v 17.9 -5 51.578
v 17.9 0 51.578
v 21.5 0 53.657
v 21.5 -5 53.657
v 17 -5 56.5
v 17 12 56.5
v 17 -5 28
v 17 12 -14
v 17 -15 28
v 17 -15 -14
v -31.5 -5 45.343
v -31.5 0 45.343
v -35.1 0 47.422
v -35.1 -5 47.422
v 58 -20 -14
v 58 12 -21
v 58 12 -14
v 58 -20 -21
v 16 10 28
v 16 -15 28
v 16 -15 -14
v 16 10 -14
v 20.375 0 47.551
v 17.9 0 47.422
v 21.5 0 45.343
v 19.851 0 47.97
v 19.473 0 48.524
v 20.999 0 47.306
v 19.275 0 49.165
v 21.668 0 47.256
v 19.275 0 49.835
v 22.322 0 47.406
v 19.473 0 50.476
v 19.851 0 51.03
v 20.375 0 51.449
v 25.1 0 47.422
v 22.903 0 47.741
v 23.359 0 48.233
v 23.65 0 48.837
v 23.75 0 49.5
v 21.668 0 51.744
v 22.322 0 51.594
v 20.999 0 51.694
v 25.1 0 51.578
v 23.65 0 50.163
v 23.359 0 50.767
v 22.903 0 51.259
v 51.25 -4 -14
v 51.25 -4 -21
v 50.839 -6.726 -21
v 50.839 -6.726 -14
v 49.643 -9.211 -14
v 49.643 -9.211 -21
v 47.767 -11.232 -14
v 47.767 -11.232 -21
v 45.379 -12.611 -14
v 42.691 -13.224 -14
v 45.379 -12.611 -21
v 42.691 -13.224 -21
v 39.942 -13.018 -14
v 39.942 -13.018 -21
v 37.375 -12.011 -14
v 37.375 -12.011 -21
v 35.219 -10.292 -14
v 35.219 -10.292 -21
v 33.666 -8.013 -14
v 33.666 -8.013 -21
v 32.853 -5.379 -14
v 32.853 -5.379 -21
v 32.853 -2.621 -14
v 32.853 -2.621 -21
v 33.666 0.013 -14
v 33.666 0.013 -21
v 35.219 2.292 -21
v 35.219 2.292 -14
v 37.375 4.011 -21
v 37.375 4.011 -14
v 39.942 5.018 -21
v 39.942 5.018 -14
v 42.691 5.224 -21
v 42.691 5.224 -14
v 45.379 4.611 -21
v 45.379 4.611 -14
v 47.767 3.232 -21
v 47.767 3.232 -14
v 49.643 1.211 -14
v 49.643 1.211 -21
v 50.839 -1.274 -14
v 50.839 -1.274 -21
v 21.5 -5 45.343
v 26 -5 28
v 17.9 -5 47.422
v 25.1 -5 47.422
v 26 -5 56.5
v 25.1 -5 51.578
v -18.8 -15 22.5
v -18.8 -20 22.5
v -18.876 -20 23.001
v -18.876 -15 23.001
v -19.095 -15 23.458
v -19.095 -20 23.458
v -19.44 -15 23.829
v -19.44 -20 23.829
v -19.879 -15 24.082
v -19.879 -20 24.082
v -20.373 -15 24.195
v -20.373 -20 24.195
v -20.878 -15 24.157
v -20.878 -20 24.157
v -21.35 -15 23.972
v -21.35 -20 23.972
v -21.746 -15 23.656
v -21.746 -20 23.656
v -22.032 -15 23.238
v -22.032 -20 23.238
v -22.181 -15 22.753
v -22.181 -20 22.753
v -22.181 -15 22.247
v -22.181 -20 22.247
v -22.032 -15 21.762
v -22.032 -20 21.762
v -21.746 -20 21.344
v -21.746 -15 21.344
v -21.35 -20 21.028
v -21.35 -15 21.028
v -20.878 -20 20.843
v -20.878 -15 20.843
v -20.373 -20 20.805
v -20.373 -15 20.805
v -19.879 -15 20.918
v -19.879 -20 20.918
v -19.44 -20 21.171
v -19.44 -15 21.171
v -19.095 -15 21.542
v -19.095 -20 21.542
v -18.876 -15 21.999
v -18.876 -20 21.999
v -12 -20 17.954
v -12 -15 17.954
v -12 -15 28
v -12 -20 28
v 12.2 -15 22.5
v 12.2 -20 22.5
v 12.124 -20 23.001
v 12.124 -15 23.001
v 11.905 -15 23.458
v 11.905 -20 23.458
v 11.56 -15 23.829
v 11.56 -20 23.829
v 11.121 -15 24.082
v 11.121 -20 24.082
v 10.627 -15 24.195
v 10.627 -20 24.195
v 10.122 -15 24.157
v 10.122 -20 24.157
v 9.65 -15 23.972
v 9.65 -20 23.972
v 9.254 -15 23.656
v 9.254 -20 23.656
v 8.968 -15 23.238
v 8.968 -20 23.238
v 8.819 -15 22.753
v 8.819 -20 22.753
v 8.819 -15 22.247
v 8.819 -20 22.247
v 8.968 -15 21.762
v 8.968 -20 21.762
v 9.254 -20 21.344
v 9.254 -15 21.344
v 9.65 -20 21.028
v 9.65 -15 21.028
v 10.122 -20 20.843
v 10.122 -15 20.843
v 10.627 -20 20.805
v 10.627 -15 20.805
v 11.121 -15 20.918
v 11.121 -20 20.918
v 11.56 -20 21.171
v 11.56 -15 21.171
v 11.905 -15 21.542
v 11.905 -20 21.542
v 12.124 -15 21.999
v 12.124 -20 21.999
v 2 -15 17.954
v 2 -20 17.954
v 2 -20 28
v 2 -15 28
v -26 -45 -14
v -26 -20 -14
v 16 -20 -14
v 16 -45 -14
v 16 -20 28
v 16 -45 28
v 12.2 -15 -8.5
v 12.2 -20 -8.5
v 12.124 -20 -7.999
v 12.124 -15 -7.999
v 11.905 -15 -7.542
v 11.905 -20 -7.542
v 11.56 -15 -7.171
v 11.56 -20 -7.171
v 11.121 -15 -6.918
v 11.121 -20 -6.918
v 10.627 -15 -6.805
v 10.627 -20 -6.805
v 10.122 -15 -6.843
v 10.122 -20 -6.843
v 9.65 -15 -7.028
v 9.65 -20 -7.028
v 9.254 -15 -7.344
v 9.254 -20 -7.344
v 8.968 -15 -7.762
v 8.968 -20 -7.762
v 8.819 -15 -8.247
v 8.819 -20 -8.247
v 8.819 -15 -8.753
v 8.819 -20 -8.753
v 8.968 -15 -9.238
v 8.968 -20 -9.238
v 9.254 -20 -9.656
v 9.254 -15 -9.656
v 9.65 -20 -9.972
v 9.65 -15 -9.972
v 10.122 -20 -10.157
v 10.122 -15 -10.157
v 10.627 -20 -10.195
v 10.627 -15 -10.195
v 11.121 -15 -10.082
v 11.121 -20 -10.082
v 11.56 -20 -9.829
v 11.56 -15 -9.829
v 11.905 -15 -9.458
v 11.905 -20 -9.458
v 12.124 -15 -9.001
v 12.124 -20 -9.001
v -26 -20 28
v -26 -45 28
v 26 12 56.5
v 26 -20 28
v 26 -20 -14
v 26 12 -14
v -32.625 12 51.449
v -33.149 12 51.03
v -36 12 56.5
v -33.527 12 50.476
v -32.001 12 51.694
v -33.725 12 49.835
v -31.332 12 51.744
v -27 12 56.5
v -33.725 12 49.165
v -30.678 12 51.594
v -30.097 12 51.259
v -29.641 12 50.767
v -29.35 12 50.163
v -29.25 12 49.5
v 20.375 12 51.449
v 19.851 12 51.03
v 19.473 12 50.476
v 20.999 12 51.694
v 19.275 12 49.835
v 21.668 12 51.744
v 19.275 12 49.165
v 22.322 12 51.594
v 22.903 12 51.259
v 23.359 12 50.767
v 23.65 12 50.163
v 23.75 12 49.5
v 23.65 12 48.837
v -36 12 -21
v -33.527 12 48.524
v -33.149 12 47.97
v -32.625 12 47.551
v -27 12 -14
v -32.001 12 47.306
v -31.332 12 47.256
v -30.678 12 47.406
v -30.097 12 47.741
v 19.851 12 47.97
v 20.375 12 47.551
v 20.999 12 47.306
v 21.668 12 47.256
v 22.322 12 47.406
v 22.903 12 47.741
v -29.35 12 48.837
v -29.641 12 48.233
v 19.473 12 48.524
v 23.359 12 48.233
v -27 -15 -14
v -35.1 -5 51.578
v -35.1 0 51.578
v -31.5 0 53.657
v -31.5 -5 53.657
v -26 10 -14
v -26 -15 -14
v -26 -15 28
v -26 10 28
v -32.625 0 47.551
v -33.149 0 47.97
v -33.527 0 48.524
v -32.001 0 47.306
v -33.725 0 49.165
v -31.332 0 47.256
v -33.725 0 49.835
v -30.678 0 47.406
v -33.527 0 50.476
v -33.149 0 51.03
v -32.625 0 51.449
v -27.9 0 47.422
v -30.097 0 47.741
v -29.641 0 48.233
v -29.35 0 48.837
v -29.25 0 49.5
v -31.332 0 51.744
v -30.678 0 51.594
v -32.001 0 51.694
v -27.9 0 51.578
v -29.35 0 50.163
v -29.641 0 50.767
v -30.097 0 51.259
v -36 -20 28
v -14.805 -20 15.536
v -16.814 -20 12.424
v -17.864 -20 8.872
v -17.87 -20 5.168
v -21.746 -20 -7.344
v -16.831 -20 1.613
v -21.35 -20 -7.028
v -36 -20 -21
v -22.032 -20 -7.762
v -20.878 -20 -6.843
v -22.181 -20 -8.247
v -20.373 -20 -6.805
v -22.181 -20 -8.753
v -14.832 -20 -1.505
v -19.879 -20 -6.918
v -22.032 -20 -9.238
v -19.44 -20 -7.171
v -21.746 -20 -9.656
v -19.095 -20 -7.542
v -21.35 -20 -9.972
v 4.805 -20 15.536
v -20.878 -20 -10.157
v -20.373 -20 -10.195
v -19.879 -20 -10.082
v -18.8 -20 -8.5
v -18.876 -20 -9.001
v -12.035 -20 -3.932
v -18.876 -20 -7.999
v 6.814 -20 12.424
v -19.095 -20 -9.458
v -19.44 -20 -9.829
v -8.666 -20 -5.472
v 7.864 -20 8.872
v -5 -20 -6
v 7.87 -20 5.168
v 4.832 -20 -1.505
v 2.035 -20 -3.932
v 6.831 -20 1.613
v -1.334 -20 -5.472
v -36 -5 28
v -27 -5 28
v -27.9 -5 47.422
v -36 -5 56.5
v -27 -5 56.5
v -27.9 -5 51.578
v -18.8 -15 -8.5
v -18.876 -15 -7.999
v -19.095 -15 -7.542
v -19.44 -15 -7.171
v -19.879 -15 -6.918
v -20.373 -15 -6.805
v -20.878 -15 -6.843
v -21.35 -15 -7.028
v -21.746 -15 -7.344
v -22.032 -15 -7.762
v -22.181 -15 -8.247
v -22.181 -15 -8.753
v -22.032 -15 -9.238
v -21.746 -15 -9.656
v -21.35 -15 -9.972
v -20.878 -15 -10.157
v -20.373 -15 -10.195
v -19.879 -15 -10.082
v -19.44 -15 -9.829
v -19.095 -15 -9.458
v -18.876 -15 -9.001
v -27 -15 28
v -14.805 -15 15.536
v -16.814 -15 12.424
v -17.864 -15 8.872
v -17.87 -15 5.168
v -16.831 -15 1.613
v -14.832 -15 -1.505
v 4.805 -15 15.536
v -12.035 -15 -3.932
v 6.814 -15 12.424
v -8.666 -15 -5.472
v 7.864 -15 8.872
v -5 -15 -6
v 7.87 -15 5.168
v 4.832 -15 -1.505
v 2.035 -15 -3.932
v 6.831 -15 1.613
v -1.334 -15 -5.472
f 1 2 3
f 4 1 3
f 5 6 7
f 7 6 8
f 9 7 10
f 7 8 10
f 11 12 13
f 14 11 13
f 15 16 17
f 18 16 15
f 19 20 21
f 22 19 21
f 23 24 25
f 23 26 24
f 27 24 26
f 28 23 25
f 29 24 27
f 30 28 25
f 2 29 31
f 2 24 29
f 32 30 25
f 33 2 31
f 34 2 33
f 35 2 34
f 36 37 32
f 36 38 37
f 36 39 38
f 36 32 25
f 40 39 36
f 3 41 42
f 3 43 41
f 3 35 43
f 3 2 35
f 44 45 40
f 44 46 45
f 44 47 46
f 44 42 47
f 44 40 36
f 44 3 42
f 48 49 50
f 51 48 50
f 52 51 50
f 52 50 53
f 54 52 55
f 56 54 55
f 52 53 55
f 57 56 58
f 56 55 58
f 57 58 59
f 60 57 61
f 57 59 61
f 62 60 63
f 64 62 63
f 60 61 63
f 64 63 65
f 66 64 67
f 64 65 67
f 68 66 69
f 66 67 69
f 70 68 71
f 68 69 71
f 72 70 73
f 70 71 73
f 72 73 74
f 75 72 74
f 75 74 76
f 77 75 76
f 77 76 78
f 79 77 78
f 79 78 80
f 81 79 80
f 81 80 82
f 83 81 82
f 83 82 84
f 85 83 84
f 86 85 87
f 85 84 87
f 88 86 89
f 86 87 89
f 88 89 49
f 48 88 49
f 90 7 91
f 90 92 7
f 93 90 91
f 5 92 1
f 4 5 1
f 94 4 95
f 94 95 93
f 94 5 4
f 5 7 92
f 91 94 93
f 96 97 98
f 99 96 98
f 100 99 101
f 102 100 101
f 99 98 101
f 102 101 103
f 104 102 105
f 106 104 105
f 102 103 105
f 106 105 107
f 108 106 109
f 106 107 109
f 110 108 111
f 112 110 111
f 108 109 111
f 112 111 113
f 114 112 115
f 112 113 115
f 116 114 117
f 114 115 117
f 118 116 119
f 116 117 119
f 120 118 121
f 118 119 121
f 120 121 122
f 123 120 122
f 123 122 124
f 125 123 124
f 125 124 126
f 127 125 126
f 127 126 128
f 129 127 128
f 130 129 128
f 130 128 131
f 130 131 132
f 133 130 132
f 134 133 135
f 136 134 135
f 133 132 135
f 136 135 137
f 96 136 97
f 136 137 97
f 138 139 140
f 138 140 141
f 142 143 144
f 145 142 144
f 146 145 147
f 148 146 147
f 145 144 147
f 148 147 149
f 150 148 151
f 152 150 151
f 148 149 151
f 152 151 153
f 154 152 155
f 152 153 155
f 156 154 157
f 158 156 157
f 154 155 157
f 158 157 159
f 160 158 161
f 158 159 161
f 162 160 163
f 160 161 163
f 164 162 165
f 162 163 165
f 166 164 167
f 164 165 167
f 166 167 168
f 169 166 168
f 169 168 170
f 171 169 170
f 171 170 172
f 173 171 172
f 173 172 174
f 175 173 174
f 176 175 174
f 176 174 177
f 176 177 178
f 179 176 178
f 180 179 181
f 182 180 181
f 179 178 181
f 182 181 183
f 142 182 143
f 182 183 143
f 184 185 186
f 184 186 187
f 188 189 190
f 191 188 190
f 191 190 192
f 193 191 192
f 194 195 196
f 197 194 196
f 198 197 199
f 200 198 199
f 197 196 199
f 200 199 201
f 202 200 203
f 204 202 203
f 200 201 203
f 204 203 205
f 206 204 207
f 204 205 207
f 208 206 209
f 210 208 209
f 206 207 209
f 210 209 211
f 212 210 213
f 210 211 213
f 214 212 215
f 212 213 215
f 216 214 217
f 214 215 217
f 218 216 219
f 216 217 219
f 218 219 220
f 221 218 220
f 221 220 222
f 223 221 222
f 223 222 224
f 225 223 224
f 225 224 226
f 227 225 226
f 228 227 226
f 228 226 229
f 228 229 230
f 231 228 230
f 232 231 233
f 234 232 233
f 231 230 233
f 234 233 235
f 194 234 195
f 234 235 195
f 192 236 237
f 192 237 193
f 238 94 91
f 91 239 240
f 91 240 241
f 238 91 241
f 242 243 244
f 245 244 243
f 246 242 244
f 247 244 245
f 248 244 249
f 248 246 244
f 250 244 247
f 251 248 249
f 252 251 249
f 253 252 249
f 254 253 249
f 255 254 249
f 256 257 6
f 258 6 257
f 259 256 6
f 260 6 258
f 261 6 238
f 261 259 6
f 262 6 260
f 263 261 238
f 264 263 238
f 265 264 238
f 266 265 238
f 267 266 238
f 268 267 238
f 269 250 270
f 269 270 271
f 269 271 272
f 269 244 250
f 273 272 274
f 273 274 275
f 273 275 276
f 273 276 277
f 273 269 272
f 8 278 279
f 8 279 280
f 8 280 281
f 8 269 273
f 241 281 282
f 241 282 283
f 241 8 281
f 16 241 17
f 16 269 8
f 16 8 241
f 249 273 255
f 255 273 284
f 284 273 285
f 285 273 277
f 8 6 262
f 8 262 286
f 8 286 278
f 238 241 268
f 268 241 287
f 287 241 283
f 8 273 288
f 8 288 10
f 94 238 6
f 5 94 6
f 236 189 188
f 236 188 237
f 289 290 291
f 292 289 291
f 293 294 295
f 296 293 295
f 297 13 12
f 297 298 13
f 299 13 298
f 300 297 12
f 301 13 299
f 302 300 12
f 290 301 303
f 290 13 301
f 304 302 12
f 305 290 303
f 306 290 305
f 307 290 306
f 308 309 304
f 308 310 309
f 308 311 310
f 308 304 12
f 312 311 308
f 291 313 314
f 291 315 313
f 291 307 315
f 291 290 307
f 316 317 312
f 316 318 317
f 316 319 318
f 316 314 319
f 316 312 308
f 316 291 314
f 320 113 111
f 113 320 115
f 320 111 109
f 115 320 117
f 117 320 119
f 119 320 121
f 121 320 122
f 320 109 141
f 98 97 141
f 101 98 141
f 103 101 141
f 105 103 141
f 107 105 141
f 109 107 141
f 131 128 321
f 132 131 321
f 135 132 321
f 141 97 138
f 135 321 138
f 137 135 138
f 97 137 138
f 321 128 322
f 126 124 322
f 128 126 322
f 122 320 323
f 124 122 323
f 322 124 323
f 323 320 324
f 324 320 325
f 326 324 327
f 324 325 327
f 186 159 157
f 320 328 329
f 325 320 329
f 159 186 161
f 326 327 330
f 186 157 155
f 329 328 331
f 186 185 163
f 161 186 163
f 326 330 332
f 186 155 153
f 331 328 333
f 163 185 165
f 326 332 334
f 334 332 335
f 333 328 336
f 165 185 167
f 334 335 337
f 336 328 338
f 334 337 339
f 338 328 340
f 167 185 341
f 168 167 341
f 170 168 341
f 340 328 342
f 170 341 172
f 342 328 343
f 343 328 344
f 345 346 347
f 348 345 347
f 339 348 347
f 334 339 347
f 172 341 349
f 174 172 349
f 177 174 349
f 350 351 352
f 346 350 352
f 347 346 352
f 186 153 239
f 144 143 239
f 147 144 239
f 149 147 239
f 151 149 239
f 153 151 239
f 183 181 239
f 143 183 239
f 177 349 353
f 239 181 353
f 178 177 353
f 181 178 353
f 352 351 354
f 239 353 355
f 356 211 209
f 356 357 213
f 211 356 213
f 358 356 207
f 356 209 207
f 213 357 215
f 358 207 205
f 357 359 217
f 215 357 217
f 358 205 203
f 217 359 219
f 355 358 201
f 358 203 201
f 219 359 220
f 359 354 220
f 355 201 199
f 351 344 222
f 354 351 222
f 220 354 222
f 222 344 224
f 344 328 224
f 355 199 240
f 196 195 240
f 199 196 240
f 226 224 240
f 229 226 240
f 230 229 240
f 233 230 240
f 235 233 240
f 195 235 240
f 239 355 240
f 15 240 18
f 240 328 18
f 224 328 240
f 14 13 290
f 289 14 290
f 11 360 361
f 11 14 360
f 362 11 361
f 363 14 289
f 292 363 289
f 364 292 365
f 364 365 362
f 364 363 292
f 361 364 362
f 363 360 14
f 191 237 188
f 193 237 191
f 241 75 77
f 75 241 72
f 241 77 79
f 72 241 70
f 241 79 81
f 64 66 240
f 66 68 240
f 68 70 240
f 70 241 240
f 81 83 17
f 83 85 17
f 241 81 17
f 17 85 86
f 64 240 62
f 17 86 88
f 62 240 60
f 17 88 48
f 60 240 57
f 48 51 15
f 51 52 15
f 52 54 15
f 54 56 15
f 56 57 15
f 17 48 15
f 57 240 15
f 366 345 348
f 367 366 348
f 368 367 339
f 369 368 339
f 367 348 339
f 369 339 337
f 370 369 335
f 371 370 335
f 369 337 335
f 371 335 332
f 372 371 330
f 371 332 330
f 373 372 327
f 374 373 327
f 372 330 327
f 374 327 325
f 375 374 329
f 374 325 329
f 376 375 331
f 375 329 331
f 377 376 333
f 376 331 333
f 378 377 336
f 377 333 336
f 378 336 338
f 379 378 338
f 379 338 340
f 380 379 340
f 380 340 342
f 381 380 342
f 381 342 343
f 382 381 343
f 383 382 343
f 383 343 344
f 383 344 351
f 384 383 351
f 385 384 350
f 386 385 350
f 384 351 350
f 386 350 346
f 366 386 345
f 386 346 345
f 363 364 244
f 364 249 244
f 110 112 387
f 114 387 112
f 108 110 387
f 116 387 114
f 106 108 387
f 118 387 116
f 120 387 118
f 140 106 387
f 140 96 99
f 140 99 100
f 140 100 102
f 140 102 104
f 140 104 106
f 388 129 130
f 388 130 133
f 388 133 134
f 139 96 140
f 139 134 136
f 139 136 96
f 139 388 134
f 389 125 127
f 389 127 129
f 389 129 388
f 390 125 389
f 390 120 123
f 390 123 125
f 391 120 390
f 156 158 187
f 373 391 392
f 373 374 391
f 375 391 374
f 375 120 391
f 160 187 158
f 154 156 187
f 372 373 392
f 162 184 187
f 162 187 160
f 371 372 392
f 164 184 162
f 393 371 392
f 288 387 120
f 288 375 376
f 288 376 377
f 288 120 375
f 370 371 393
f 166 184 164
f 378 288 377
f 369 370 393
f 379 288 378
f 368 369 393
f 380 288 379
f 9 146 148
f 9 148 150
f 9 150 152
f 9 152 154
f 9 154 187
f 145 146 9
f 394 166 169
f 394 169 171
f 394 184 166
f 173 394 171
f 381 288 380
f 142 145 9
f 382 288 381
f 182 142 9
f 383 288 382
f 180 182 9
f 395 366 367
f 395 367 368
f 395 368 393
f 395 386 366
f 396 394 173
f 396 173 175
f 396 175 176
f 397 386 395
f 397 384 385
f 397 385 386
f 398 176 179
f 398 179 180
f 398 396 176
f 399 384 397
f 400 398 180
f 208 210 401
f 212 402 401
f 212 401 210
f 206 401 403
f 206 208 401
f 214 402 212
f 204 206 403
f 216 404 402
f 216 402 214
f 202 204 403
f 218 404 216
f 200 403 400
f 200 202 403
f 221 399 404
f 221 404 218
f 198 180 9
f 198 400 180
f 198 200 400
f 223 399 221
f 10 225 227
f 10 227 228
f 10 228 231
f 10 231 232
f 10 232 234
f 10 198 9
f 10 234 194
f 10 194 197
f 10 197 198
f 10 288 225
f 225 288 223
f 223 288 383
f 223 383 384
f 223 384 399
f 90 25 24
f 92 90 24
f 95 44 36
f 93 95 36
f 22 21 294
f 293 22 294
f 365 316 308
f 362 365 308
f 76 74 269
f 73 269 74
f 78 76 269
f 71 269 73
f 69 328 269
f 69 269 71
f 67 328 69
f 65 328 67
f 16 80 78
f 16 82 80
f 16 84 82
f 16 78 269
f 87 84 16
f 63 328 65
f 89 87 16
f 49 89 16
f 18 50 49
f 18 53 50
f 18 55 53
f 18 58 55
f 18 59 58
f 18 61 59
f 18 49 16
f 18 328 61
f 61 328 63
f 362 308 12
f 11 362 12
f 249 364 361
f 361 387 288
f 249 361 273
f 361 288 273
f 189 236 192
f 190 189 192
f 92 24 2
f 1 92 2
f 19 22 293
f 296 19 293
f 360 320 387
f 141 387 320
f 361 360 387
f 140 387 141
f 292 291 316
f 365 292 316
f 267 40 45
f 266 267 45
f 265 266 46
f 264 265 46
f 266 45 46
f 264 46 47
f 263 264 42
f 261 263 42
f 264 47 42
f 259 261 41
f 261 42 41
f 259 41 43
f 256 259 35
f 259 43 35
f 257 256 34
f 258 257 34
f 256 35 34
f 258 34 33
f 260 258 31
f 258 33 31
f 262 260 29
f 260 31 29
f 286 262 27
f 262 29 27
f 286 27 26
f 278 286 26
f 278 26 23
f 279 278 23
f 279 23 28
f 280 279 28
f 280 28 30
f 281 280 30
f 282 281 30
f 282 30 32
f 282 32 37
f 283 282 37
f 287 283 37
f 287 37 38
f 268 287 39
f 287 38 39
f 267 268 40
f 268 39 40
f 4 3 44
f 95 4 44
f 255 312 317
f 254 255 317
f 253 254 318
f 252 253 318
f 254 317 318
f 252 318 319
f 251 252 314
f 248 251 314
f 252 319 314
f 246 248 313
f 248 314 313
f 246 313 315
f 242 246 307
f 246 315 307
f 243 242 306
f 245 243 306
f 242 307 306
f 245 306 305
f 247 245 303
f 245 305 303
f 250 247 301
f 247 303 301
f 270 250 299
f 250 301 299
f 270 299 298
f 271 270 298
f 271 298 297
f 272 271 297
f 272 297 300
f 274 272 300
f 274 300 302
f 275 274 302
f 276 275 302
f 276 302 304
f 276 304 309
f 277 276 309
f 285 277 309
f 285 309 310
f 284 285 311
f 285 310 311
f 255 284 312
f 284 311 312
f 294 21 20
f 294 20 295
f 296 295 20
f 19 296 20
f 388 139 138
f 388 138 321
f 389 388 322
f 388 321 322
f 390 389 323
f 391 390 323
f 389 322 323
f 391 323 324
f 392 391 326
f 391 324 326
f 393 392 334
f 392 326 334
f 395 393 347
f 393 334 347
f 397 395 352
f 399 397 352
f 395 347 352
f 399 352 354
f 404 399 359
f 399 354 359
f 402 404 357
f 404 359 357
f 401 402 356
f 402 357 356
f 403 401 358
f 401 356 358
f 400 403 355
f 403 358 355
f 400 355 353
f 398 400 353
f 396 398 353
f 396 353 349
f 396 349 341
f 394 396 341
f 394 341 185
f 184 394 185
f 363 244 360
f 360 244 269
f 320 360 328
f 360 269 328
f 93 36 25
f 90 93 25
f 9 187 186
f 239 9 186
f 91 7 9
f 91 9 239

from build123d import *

# Parameters (mm, degrees)
F1_R      = 2.25
F2_DEPTH  = 12
F4_DEPTH  = 5
F5_W      = 44
F5_H      = 10
F5_H_2    = 5
F6_DEPTH  = 7
F7_DEPTH  = 42
F8_R      = 1.7
F8_R_2    = 13
F9_DEPTH  = 5
F11_REACH = 63.8670687473
F12_R     = 1.7
F13_DEPTH = 25
F14_W     = 42
F14_H     = 42
F14_R     = 1.7
F14_R_2   = 13
F15_DEPTH = 25
F16_W     = 32
F16_H     = 32
F16_R     = 9.25
F17_DEPTH = 7


with BuildPart() as f2:
    # F1 (on Front) → F2 (new body)
    with BuildSketch(Plane.XZ):
        Polygon((-27, 56.5), (-36, 56.5), (-36, -21), (26, -21), (26, 56.5), (17, 56.5), (17, -14), (-27, -14), align=None)
        with Locations((-31.5, 49.5)):
            Circle(F1_R, mode=Mode.SUBTRACT)
        with Locations((21.5, 49.5)):
            Circle(F1_R, mode=Mode.SUBTRACT)
    extrude(amount=-F2_DEPTH)

    # F3 (on face) → F4 (join)
    with BuildSketch(Plane.XZ):
        Polygon((-27, -14), (-27, 56.5), (-36, 56.5), (-36, -21), (26, -21), (26, 56.5), (17, 56.5), (17, -14), align=None)
        Polygon((-31.5, 53.6569219382), (-27.9, 51.5784609691), (-27.9, 47.4215390309), (-31.5, 45.3430780618), (-35.1, 47.4215390309), (-35.1, 51.5784609691), align=None, mode=Mode.SUBTRACT)
        Polygon((21.5, 53.6569219382), (25.1, 51.5784609691), (25.1, 47.4215390309), (21.5, 45.3430780618), (17.9, 47.4215390309), (17.9, 51.5784609691), align=None, mode=Mode.SUBTRACT)
    extrude(amount=F4_DEPTH)

    # F5 (on face) → F6 (join, through all)
    with BuildSketch(Plane.XY.offset(-14)):
        with Locations((-5, -10)):
            Rectangle(F5_W, F5_H)
        with Locations((-5, -17.5)):
            Rectangle(F5_W, F5_H_2)
        Polygon((-27, -15), (-27, -5), (-36, -5), (-36, -20), (-27, -20), align=None)
        Polygon((26, -5), (17, -5), (17, -15), (17, -20), (26, -20), align=None)
    extrude(amount=-F6_DEPTH)

    # F5 (on face) → F7 (join)
    with BuildSketch(Plane.XY.offset(-14)):
        with Locations((-5, -17.5)):
            Rectangle(F5_W, F5_H_2)
        Polygon((-27, -15), (-27, -5), (-36, -5), (-36, -20), (-27, -20), align=None)
        Polygon((26, -5), (17, -5), (17, -15), (17, -20), (26, -20), align=None)
    extrude(amount=F7_DEPTH)

    # F8 (on face) → F9 (cut, through all)
    with BuildSketch(Plane.XZ.offset(20)):
        with Locations((-20.5, 22.5)):
            Circle(F8_R)
        with Locations((-5, 7)):
            Circle(F8_R_2)
        with Locations((-20.5, -8.5)):
            Circle(F8_R)
        with Locations((10.5, -8.5)):
            Circle(F8_R)
        with Locations((10.5, 22.5)):
            Circle(F8_R)
    extrude(amount=-F9_DEPTH, mode=Mode.SUBTRACT)

    f11_end = f2.faces().sort_by_distance((-18, -17.5, 7))[0]
    # F10 (on face) → F11 (cut, up to a face of the model that its end follows)
    with BuildSketch(Plane.XY.offset(28)):
        Polygon((2, -15), (-5, -15), (-12, -15), (-12, -20), (2, -20), align=None)
    f11_long = extrude(amount=-F11_REACH, mode=Mode.PRIVATE)
    add(split(f11_long, bisect_by=f11_end, keep=Keep.ALL, mode=Mode.PRIVATE).solids().sort_by_distance((-5, -17.5, 28))[0], mode=Mode.SUBTRACT)

    # F16 (on face) → F17 (join, through all)
    with BuildSketch(Plane(origin=(0, 0, -21), x_dir=(1, 0, 0), z_dir=(0, 0, -1))):
        with Locations((42, 4)):
            Rectangle(F16_W, F16_H)
        with Locations((42, 4)):
            Circle(F16_R, mode=Mode.SUBTRACT)
    extrude(amount=-F17_DEPTH)


with BuildPart() as f13:
    # F12 (on face) → F13 (new body)
    with BuildSketch(Plane(origin=(0, -15, 0), x_dir=(-1, 0, 0), z_dir=(0, 1, 0))):
        with BuildLine():
            Line((-16, -14), (26, -14))
            Line((26, -14), (26, 28))
            Line((26, 28), (12, 28))
            Line((12, 28), (12, 17.9544511501))
            ThreePointArc((12, 17.9544511501), (5, -6), (-2, 17.9544511501))
            Line((-2, 17.9544511501), (-2, 28))
            Line((-2, 28), (-16, 28))
            Line((-16, 28), (-16, -14))
        make_face()
        with Locations((-10.5, -8.5)):
            Circle(F12_R, mode=Mode.SUBTRACT)
        with Locations((20.5, -8.5)):
            Circle(F12_R, mode=Mode.SUBTRACT)
        with Locations((-10.5, 22.5)):
            Circle(F12_R, mode=Mode.SUBTRACT)
        with Locations((20.5, 22.5)):
            Circle(F12_R, mode=Mode.SUBTRACT)
        with BuildLine():
            Line((12, 17.9544511501), (12, 28))
            Line((12, 28), (-2, 28))
            Line((-2, 28), (-2, 17.9544511501))
            ThreePointArc((-2, 17.9544511501), (5, -6), (12, 17.9544511501))
        make_face()
        with Locations((-10.5, 22.5)):
            Circle(F12_R)
        with Locations((20.5, 22.5)):
            Circle(F12_R)
        with Locations((-10.5, -8.5)):
            Circle(F12_R)
        with Locations((20.5, -8.5)):
            Circle(F12_R)
    extrude(amount=F13_DEPTH)


with BuildPart() as f15:
    # F14 (on face) → F15 (new body)
    with BuildSketch(Plane.XZ.offset(20)):
        with Locations((-5, 7)):
            Rectangle(F14_W, F14_H)
        with Locations((-20.5, -8.5)):
            Circle(F14_R, mode=Mode.SUBTRACT)
        with Locations((10.5, -8.5)):
            Circle(F14_R, mode=Mode.SUBTRACT)
        with Locations((-20.5, 22.5)):
            Circle(F14_R, mode=Mode.SUBTRACT)
        with Locations((-5, 7)):
            Circle(F14_R_2, mode=Mode.SUBTRACT)
        with Locations((10.5, 22.5)):
            Circle(F14_R, mode=Mode.SUBTRACT)
    extrude(amount=F15_DEPTH)

    # F8 (on face) → F15, piece 2 (join)
    with BuildSketch(Plane.XZ.offset(20)):
        with Locations((-20.5, 22.5)):
            Circle(F8_R)
    extrude(amount=F15_DEPTH)

    # F8 (on face) → F15, piece 3 (join)
    with BuildSketch(Plane.XZ.offset(20)):
        with Locations((-5, 7)):
            Circle(F8_R_2)
    extrude(amount=F15_DEPTH)

    # F8 (on face) → F15, piece 4 (join)
    with BuildSketch(Plane.XZ.offset(20)):
        with Locations((-20.5, -8.5)):
            Circle(F8_R)
    extrude(amount=F15_DEPTH)

    # F8 (on face) → F15, piece 5 (join)
    with BuildSketch(Plane.XZ.offset(20)):
        with Locations((10.5, 22.5)):
            Circle(F8_R)
    extrude(amount=F15_DEPTH)

    # F8 (on face) → F15, piece 6 (join)
    with BuildSketch(Plane.XZ.offset(20)):
        with Locations((10.5, -8.5)):
            Circle(F8_R)
    extrude(amount=F15_DEPTH)


solid = Compound([f2.part, f13.part, f15.part])
